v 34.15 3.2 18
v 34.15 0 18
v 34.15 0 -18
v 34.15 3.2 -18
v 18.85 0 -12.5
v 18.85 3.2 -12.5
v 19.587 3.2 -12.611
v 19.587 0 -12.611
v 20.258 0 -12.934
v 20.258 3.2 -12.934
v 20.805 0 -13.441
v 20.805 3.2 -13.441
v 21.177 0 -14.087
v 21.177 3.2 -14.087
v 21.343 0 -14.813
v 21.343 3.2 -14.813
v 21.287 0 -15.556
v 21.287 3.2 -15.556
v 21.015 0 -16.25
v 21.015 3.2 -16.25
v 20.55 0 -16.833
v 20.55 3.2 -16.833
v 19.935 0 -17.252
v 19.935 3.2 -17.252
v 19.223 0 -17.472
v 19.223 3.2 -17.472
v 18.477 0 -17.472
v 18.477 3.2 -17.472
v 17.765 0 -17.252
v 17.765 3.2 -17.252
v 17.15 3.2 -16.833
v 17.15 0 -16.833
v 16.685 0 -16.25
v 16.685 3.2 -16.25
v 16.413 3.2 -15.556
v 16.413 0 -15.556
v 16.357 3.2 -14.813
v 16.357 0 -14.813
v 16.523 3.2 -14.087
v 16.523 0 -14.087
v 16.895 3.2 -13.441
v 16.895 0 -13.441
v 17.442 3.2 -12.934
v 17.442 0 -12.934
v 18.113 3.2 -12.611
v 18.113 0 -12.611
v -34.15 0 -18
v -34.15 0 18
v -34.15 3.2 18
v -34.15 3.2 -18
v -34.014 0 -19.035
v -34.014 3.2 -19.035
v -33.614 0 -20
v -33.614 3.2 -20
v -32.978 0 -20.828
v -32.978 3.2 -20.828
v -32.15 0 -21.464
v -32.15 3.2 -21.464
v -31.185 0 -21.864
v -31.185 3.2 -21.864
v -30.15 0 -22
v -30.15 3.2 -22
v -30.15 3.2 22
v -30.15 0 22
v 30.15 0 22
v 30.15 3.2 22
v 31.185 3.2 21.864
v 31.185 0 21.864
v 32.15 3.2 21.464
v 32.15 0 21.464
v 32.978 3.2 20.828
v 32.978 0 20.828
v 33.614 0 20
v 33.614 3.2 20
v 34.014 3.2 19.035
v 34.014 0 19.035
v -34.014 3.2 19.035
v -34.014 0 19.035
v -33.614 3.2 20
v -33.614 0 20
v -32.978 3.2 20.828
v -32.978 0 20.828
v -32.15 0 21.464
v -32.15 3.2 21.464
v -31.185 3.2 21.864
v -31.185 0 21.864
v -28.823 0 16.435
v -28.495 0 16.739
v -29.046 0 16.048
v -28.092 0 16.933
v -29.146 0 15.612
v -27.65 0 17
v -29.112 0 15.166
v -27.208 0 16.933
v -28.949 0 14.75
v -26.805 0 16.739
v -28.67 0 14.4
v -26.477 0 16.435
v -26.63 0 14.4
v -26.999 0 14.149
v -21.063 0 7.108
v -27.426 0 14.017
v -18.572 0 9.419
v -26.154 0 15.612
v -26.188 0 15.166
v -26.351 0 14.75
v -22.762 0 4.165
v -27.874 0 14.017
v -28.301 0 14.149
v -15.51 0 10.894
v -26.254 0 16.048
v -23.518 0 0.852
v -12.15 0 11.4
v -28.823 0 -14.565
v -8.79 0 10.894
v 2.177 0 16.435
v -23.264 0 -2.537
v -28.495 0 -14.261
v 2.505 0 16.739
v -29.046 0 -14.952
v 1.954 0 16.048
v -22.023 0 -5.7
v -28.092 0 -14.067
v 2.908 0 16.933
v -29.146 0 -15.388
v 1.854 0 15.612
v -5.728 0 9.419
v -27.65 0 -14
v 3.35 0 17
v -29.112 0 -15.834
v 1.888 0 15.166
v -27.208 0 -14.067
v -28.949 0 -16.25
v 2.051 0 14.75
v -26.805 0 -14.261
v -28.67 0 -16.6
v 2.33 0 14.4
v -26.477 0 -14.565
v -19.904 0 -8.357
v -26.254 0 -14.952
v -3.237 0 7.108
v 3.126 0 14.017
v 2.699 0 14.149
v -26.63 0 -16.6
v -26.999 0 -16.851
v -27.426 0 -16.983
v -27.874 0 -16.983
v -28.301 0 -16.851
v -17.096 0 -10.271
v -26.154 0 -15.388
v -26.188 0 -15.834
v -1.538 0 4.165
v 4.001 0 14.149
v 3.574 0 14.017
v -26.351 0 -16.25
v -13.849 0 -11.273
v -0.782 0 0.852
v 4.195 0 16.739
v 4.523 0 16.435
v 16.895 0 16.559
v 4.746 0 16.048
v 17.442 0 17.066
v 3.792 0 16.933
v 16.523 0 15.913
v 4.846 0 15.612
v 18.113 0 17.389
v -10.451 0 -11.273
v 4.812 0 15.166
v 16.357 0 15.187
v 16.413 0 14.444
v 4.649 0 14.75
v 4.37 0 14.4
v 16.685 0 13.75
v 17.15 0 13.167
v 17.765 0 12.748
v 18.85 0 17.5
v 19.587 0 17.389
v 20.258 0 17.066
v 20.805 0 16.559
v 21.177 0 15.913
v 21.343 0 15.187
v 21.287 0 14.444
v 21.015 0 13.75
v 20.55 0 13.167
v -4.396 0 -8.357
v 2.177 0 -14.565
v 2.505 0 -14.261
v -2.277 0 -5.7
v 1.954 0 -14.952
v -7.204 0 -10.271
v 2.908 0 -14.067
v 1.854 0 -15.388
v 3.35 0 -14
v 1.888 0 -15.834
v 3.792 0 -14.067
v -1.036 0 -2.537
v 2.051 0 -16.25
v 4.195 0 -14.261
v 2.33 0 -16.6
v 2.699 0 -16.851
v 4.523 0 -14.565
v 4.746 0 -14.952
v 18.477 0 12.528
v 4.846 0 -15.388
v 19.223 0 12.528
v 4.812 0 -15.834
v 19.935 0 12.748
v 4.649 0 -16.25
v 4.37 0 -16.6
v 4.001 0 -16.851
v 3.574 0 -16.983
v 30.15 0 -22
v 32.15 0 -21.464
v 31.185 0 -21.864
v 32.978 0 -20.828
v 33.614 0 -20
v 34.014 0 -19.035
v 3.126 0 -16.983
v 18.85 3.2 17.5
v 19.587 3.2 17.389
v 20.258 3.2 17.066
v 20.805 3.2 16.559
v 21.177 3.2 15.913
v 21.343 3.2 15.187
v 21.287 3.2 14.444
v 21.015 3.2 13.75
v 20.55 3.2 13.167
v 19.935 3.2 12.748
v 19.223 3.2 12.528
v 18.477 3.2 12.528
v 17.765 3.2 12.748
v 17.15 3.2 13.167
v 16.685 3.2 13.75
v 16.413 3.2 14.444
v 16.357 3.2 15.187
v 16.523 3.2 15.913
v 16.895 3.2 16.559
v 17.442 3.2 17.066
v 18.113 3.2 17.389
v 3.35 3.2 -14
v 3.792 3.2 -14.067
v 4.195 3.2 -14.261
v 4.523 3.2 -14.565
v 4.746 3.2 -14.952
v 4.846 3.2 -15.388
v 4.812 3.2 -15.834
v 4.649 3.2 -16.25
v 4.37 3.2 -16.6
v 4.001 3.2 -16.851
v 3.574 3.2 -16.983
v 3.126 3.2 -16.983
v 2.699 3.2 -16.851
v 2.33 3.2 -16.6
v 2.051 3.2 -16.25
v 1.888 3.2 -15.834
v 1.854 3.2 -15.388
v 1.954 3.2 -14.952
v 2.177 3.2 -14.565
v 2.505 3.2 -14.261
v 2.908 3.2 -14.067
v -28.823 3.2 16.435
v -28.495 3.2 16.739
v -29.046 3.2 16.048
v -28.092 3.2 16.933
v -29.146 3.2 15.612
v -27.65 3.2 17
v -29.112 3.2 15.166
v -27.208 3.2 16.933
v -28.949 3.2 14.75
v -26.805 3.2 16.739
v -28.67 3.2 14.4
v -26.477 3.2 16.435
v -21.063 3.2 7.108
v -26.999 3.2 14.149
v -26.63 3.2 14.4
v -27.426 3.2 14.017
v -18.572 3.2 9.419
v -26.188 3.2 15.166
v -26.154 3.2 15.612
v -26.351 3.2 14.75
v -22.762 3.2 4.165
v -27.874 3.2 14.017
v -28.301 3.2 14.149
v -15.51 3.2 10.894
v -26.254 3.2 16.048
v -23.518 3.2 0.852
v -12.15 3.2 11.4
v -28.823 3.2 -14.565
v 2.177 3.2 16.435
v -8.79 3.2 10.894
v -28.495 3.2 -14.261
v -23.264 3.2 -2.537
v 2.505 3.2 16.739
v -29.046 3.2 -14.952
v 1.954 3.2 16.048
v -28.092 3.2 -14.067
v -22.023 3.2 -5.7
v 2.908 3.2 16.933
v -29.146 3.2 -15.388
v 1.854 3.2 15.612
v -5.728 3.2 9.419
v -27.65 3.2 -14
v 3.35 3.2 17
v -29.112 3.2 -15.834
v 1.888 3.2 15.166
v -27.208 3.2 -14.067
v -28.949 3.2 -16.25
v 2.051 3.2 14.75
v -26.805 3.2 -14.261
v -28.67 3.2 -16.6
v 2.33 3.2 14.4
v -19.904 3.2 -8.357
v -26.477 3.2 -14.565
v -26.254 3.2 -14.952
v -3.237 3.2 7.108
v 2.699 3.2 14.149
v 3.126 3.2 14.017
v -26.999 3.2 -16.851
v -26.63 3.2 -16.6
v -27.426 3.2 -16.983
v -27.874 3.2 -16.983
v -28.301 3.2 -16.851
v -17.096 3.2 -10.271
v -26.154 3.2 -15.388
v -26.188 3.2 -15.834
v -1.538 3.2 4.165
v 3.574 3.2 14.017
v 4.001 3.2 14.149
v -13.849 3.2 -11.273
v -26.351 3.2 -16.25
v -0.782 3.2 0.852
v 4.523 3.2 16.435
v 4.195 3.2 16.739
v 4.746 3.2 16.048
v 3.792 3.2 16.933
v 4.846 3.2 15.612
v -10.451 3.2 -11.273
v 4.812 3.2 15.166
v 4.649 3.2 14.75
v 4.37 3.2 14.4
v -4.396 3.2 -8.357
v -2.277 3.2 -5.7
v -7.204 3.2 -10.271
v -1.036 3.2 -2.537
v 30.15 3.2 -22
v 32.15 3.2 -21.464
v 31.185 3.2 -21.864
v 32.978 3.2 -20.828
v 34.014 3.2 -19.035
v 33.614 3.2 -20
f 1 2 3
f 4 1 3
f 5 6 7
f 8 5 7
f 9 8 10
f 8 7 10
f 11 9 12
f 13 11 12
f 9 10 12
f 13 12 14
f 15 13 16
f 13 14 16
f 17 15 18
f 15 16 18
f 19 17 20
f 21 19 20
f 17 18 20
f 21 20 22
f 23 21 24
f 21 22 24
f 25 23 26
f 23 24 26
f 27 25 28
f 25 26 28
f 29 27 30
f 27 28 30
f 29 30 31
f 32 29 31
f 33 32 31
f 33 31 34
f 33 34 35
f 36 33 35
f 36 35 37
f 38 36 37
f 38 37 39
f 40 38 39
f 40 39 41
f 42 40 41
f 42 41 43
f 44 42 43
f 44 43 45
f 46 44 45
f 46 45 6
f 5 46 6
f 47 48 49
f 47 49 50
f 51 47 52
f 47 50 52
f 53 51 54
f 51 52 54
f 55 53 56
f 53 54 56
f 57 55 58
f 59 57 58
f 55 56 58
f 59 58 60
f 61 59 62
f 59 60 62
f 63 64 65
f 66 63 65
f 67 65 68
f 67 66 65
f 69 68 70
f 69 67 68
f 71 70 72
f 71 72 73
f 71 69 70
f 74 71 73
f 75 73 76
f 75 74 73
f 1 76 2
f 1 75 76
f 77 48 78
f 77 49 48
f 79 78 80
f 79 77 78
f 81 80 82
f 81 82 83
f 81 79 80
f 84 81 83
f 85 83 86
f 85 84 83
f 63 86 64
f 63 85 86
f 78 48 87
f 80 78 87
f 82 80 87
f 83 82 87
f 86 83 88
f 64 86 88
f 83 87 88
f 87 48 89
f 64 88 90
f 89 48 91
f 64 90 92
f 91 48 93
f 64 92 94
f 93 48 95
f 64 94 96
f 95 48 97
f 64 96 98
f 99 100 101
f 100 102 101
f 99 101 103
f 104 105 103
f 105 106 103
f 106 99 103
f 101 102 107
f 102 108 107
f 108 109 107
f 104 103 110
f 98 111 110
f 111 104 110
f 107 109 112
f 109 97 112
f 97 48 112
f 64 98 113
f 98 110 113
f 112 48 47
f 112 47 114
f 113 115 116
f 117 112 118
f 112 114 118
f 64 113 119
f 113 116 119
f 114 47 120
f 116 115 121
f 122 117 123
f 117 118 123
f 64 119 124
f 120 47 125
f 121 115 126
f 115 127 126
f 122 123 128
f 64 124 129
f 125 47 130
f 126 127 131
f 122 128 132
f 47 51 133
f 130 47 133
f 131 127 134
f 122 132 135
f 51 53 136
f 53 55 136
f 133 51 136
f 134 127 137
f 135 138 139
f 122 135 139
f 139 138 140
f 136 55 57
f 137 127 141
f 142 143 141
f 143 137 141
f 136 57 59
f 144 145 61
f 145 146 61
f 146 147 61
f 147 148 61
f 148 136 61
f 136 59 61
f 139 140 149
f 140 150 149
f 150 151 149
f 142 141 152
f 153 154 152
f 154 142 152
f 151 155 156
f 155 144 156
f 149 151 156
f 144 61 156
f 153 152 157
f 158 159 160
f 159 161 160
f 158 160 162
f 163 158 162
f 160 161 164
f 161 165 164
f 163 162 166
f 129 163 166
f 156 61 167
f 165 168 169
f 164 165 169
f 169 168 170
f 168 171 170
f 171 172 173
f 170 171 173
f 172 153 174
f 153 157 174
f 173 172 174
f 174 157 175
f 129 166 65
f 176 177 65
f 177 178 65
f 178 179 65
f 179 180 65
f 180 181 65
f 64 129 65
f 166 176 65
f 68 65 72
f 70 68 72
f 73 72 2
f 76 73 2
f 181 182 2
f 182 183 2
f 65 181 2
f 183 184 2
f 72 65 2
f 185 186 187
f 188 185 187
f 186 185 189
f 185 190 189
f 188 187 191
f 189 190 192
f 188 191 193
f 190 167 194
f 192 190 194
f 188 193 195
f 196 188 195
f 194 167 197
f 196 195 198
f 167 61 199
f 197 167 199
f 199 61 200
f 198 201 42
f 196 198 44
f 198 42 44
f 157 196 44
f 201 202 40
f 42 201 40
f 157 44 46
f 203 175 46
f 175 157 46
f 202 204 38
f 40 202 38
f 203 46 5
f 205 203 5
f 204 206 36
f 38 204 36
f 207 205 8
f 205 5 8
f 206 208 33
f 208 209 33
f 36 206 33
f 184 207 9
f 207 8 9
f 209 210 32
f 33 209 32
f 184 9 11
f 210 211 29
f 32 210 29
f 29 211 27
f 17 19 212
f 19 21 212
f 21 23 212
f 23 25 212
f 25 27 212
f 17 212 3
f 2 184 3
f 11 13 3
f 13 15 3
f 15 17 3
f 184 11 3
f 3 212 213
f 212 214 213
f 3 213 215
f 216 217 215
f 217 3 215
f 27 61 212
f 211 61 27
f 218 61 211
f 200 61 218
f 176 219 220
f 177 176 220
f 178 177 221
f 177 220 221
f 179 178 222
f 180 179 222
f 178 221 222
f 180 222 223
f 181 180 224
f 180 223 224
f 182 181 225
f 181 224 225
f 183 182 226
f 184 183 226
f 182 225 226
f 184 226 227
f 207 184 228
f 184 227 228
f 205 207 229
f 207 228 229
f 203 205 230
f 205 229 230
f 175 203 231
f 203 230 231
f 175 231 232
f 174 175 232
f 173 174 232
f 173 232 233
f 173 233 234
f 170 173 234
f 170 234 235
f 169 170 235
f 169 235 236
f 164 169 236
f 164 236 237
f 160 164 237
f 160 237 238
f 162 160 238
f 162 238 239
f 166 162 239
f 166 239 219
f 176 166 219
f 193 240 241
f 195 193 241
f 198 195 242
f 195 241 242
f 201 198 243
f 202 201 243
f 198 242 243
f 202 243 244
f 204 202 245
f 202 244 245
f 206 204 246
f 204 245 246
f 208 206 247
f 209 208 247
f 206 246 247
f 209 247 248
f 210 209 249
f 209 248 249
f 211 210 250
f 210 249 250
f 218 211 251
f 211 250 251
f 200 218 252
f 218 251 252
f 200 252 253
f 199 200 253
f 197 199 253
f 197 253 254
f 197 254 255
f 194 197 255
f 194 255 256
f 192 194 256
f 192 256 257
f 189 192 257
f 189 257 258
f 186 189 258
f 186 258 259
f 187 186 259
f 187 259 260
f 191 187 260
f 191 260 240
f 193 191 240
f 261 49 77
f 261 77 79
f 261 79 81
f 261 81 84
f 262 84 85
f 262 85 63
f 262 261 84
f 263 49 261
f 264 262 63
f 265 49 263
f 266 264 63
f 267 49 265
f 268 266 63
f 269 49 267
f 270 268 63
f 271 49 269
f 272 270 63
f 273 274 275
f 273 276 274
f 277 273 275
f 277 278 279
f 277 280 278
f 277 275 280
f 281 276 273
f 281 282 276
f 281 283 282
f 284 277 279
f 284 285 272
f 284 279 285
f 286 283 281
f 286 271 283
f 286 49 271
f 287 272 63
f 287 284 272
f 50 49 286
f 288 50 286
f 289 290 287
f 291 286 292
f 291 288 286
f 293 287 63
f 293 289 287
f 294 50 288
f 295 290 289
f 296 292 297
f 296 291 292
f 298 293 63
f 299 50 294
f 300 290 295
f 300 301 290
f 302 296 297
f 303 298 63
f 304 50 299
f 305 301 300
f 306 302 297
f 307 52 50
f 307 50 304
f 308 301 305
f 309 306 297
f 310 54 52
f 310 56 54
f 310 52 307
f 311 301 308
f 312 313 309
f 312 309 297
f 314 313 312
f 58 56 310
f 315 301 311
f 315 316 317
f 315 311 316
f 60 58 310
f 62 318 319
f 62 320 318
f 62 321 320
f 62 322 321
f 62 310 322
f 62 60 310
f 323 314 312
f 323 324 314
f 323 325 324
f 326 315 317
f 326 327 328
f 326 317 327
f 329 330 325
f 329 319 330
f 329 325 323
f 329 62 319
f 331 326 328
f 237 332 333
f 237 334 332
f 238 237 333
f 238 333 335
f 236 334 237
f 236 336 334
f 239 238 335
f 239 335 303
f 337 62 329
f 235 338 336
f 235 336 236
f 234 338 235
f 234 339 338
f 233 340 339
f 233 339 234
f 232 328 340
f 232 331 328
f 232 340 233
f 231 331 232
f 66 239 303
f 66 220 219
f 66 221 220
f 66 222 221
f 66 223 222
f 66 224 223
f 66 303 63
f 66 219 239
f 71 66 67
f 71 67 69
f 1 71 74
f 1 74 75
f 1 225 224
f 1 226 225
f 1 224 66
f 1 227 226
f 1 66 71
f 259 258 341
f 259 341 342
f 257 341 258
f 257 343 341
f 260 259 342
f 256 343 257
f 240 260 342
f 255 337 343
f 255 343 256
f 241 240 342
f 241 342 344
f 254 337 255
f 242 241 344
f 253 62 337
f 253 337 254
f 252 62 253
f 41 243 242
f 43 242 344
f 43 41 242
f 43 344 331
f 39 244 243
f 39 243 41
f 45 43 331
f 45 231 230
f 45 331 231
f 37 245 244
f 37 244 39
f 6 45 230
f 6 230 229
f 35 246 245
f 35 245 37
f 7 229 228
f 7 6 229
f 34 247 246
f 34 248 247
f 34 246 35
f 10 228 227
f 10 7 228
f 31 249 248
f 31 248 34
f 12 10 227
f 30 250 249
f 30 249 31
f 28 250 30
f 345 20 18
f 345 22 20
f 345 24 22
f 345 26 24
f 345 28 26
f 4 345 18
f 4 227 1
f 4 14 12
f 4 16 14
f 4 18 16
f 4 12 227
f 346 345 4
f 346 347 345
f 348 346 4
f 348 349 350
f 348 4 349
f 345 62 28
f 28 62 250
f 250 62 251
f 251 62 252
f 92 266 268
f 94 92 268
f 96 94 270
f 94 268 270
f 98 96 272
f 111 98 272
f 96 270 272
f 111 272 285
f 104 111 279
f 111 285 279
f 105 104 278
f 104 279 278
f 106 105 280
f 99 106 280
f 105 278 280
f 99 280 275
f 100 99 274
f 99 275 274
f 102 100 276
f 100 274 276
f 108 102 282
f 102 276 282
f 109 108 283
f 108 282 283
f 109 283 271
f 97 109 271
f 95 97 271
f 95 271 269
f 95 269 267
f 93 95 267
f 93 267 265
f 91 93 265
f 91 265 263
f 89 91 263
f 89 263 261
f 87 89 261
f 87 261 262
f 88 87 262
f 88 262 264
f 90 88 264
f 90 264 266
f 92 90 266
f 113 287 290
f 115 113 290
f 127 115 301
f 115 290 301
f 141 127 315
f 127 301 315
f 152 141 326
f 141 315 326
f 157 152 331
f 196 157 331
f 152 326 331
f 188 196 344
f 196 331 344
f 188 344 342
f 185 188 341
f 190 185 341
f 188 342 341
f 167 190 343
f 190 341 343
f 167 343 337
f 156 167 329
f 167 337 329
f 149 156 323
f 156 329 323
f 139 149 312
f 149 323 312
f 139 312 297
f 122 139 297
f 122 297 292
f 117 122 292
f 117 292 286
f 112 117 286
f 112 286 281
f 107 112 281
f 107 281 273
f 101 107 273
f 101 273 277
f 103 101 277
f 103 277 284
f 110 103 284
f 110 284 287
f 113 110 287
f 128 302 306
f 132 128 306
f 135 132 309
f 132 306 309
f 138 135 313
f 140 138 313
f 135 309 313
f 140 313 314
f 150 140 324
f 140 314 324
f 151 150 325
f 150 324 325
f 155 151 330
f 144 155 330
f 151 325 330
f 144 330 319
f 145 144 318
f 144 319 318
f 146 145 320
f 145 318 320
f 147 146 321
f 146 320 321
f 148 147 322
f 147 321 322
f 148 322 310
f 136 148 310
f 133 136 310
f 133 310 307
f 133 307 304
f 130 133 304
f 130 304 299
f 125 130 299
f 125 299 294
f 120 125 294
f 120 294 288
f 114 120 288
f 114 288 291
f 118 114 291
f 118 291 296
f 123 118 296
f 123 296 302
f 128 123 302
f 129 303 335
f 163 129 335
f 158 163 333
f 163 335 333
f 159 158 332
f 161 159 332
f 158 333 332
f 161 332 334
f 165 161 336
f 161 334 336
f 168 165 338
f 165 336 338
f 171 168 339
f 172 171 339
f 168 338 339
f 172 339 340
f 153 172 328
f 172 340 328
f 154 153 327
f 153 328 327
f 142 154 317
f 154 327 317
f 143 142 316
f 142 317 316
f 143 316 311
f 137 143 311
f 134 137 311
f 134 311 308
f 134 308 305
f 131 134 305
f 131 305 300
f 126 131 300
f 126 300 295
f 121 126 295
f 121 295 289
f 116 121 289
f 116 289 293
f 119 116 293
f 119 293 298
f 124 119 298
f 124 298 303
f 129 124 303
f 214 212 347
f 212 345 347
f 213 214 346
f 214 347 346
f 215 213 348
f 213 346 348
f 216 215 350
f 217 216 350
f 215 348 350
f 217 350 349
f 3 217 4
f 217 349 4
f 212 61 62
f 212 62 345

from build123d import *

# Parameters (mm, degrees)
SKETCH1_W           = 68.3
SKETCH1_H           = 44
BOSS_EXTRUDE1_DEPTH = 3.2
SKETCH2_R           = 11.4
SKETCH2_R_2         = 2.5
SKETCH2_R_3         = 1.5
CUT_EXTRUDE2_DEPTH  = 41.748772988
FILLET1_R           = 4


with BuildPart() as part:
    # Sketch1 → Boss-Extrude1 (new body)
    with BuildSketch(Plane(origin=(0, 0, 0), x_dir=(1, 0, 0), z_dir=(0, 1, 0))):
        Rectangle(SKETCH1_W, SKETCH1_H)
    extrude(amount=BOSS_EXTRUDE1_DEPTH)

    # Sketch2 → Cut-Extrude2 (cut, through all)
    with BuildSketch(Plane(origin=(0, 3.2, 0), x_dir=(1, 0, 0), z_dir=(0, 1, 0))):
        with Locations(Location((-12.15, 0, 0), (0, 0, 270))):
            Circle(SKETCH2_R)
        with Locations(Location((18.85, 15, 0), (0, 0, 270))):
            Circle(SKETCH2_R_2)
        with Locations(Location((18.85, -15, 0), (0, 0, 270))):
            Circle(SKETCH2_R_2)
        with Locations(Location((-27.65, 15.5, 0), (0, 0, 270))):
            Circle(SKETCH2_R_3)
        with Locations(Location((3.35, 15.5, 0), (0, 0, 270))):
            Circle(SKETCH2_R_3)
        with Locations(Location((3.35, -15.5, 0), (0, 0, 270))):
            Circle(SKETCH2_R_3)
        with Locations(Location((-27.65, -15.5, 0), (0, 0, 270))):
            Circle(SKETCH2_R_3)
    extrude(amount=-CUT_EXTRUDE2_DEPTH, mode=Mode.SUBTRACT)

    # Fillet1
    fillet1_edges = [part.edges().sort_by_distance(p)[0] for p in [
        (34.15, 1.6, 22),
        (-34.15, 1.6, 22),
        (-34.15, 1.6, -22),
        (34.15, 1.6, -22),
    ]]
    fillet(fillet1_edges, radius=FILLET1_R)


solid = part.part
